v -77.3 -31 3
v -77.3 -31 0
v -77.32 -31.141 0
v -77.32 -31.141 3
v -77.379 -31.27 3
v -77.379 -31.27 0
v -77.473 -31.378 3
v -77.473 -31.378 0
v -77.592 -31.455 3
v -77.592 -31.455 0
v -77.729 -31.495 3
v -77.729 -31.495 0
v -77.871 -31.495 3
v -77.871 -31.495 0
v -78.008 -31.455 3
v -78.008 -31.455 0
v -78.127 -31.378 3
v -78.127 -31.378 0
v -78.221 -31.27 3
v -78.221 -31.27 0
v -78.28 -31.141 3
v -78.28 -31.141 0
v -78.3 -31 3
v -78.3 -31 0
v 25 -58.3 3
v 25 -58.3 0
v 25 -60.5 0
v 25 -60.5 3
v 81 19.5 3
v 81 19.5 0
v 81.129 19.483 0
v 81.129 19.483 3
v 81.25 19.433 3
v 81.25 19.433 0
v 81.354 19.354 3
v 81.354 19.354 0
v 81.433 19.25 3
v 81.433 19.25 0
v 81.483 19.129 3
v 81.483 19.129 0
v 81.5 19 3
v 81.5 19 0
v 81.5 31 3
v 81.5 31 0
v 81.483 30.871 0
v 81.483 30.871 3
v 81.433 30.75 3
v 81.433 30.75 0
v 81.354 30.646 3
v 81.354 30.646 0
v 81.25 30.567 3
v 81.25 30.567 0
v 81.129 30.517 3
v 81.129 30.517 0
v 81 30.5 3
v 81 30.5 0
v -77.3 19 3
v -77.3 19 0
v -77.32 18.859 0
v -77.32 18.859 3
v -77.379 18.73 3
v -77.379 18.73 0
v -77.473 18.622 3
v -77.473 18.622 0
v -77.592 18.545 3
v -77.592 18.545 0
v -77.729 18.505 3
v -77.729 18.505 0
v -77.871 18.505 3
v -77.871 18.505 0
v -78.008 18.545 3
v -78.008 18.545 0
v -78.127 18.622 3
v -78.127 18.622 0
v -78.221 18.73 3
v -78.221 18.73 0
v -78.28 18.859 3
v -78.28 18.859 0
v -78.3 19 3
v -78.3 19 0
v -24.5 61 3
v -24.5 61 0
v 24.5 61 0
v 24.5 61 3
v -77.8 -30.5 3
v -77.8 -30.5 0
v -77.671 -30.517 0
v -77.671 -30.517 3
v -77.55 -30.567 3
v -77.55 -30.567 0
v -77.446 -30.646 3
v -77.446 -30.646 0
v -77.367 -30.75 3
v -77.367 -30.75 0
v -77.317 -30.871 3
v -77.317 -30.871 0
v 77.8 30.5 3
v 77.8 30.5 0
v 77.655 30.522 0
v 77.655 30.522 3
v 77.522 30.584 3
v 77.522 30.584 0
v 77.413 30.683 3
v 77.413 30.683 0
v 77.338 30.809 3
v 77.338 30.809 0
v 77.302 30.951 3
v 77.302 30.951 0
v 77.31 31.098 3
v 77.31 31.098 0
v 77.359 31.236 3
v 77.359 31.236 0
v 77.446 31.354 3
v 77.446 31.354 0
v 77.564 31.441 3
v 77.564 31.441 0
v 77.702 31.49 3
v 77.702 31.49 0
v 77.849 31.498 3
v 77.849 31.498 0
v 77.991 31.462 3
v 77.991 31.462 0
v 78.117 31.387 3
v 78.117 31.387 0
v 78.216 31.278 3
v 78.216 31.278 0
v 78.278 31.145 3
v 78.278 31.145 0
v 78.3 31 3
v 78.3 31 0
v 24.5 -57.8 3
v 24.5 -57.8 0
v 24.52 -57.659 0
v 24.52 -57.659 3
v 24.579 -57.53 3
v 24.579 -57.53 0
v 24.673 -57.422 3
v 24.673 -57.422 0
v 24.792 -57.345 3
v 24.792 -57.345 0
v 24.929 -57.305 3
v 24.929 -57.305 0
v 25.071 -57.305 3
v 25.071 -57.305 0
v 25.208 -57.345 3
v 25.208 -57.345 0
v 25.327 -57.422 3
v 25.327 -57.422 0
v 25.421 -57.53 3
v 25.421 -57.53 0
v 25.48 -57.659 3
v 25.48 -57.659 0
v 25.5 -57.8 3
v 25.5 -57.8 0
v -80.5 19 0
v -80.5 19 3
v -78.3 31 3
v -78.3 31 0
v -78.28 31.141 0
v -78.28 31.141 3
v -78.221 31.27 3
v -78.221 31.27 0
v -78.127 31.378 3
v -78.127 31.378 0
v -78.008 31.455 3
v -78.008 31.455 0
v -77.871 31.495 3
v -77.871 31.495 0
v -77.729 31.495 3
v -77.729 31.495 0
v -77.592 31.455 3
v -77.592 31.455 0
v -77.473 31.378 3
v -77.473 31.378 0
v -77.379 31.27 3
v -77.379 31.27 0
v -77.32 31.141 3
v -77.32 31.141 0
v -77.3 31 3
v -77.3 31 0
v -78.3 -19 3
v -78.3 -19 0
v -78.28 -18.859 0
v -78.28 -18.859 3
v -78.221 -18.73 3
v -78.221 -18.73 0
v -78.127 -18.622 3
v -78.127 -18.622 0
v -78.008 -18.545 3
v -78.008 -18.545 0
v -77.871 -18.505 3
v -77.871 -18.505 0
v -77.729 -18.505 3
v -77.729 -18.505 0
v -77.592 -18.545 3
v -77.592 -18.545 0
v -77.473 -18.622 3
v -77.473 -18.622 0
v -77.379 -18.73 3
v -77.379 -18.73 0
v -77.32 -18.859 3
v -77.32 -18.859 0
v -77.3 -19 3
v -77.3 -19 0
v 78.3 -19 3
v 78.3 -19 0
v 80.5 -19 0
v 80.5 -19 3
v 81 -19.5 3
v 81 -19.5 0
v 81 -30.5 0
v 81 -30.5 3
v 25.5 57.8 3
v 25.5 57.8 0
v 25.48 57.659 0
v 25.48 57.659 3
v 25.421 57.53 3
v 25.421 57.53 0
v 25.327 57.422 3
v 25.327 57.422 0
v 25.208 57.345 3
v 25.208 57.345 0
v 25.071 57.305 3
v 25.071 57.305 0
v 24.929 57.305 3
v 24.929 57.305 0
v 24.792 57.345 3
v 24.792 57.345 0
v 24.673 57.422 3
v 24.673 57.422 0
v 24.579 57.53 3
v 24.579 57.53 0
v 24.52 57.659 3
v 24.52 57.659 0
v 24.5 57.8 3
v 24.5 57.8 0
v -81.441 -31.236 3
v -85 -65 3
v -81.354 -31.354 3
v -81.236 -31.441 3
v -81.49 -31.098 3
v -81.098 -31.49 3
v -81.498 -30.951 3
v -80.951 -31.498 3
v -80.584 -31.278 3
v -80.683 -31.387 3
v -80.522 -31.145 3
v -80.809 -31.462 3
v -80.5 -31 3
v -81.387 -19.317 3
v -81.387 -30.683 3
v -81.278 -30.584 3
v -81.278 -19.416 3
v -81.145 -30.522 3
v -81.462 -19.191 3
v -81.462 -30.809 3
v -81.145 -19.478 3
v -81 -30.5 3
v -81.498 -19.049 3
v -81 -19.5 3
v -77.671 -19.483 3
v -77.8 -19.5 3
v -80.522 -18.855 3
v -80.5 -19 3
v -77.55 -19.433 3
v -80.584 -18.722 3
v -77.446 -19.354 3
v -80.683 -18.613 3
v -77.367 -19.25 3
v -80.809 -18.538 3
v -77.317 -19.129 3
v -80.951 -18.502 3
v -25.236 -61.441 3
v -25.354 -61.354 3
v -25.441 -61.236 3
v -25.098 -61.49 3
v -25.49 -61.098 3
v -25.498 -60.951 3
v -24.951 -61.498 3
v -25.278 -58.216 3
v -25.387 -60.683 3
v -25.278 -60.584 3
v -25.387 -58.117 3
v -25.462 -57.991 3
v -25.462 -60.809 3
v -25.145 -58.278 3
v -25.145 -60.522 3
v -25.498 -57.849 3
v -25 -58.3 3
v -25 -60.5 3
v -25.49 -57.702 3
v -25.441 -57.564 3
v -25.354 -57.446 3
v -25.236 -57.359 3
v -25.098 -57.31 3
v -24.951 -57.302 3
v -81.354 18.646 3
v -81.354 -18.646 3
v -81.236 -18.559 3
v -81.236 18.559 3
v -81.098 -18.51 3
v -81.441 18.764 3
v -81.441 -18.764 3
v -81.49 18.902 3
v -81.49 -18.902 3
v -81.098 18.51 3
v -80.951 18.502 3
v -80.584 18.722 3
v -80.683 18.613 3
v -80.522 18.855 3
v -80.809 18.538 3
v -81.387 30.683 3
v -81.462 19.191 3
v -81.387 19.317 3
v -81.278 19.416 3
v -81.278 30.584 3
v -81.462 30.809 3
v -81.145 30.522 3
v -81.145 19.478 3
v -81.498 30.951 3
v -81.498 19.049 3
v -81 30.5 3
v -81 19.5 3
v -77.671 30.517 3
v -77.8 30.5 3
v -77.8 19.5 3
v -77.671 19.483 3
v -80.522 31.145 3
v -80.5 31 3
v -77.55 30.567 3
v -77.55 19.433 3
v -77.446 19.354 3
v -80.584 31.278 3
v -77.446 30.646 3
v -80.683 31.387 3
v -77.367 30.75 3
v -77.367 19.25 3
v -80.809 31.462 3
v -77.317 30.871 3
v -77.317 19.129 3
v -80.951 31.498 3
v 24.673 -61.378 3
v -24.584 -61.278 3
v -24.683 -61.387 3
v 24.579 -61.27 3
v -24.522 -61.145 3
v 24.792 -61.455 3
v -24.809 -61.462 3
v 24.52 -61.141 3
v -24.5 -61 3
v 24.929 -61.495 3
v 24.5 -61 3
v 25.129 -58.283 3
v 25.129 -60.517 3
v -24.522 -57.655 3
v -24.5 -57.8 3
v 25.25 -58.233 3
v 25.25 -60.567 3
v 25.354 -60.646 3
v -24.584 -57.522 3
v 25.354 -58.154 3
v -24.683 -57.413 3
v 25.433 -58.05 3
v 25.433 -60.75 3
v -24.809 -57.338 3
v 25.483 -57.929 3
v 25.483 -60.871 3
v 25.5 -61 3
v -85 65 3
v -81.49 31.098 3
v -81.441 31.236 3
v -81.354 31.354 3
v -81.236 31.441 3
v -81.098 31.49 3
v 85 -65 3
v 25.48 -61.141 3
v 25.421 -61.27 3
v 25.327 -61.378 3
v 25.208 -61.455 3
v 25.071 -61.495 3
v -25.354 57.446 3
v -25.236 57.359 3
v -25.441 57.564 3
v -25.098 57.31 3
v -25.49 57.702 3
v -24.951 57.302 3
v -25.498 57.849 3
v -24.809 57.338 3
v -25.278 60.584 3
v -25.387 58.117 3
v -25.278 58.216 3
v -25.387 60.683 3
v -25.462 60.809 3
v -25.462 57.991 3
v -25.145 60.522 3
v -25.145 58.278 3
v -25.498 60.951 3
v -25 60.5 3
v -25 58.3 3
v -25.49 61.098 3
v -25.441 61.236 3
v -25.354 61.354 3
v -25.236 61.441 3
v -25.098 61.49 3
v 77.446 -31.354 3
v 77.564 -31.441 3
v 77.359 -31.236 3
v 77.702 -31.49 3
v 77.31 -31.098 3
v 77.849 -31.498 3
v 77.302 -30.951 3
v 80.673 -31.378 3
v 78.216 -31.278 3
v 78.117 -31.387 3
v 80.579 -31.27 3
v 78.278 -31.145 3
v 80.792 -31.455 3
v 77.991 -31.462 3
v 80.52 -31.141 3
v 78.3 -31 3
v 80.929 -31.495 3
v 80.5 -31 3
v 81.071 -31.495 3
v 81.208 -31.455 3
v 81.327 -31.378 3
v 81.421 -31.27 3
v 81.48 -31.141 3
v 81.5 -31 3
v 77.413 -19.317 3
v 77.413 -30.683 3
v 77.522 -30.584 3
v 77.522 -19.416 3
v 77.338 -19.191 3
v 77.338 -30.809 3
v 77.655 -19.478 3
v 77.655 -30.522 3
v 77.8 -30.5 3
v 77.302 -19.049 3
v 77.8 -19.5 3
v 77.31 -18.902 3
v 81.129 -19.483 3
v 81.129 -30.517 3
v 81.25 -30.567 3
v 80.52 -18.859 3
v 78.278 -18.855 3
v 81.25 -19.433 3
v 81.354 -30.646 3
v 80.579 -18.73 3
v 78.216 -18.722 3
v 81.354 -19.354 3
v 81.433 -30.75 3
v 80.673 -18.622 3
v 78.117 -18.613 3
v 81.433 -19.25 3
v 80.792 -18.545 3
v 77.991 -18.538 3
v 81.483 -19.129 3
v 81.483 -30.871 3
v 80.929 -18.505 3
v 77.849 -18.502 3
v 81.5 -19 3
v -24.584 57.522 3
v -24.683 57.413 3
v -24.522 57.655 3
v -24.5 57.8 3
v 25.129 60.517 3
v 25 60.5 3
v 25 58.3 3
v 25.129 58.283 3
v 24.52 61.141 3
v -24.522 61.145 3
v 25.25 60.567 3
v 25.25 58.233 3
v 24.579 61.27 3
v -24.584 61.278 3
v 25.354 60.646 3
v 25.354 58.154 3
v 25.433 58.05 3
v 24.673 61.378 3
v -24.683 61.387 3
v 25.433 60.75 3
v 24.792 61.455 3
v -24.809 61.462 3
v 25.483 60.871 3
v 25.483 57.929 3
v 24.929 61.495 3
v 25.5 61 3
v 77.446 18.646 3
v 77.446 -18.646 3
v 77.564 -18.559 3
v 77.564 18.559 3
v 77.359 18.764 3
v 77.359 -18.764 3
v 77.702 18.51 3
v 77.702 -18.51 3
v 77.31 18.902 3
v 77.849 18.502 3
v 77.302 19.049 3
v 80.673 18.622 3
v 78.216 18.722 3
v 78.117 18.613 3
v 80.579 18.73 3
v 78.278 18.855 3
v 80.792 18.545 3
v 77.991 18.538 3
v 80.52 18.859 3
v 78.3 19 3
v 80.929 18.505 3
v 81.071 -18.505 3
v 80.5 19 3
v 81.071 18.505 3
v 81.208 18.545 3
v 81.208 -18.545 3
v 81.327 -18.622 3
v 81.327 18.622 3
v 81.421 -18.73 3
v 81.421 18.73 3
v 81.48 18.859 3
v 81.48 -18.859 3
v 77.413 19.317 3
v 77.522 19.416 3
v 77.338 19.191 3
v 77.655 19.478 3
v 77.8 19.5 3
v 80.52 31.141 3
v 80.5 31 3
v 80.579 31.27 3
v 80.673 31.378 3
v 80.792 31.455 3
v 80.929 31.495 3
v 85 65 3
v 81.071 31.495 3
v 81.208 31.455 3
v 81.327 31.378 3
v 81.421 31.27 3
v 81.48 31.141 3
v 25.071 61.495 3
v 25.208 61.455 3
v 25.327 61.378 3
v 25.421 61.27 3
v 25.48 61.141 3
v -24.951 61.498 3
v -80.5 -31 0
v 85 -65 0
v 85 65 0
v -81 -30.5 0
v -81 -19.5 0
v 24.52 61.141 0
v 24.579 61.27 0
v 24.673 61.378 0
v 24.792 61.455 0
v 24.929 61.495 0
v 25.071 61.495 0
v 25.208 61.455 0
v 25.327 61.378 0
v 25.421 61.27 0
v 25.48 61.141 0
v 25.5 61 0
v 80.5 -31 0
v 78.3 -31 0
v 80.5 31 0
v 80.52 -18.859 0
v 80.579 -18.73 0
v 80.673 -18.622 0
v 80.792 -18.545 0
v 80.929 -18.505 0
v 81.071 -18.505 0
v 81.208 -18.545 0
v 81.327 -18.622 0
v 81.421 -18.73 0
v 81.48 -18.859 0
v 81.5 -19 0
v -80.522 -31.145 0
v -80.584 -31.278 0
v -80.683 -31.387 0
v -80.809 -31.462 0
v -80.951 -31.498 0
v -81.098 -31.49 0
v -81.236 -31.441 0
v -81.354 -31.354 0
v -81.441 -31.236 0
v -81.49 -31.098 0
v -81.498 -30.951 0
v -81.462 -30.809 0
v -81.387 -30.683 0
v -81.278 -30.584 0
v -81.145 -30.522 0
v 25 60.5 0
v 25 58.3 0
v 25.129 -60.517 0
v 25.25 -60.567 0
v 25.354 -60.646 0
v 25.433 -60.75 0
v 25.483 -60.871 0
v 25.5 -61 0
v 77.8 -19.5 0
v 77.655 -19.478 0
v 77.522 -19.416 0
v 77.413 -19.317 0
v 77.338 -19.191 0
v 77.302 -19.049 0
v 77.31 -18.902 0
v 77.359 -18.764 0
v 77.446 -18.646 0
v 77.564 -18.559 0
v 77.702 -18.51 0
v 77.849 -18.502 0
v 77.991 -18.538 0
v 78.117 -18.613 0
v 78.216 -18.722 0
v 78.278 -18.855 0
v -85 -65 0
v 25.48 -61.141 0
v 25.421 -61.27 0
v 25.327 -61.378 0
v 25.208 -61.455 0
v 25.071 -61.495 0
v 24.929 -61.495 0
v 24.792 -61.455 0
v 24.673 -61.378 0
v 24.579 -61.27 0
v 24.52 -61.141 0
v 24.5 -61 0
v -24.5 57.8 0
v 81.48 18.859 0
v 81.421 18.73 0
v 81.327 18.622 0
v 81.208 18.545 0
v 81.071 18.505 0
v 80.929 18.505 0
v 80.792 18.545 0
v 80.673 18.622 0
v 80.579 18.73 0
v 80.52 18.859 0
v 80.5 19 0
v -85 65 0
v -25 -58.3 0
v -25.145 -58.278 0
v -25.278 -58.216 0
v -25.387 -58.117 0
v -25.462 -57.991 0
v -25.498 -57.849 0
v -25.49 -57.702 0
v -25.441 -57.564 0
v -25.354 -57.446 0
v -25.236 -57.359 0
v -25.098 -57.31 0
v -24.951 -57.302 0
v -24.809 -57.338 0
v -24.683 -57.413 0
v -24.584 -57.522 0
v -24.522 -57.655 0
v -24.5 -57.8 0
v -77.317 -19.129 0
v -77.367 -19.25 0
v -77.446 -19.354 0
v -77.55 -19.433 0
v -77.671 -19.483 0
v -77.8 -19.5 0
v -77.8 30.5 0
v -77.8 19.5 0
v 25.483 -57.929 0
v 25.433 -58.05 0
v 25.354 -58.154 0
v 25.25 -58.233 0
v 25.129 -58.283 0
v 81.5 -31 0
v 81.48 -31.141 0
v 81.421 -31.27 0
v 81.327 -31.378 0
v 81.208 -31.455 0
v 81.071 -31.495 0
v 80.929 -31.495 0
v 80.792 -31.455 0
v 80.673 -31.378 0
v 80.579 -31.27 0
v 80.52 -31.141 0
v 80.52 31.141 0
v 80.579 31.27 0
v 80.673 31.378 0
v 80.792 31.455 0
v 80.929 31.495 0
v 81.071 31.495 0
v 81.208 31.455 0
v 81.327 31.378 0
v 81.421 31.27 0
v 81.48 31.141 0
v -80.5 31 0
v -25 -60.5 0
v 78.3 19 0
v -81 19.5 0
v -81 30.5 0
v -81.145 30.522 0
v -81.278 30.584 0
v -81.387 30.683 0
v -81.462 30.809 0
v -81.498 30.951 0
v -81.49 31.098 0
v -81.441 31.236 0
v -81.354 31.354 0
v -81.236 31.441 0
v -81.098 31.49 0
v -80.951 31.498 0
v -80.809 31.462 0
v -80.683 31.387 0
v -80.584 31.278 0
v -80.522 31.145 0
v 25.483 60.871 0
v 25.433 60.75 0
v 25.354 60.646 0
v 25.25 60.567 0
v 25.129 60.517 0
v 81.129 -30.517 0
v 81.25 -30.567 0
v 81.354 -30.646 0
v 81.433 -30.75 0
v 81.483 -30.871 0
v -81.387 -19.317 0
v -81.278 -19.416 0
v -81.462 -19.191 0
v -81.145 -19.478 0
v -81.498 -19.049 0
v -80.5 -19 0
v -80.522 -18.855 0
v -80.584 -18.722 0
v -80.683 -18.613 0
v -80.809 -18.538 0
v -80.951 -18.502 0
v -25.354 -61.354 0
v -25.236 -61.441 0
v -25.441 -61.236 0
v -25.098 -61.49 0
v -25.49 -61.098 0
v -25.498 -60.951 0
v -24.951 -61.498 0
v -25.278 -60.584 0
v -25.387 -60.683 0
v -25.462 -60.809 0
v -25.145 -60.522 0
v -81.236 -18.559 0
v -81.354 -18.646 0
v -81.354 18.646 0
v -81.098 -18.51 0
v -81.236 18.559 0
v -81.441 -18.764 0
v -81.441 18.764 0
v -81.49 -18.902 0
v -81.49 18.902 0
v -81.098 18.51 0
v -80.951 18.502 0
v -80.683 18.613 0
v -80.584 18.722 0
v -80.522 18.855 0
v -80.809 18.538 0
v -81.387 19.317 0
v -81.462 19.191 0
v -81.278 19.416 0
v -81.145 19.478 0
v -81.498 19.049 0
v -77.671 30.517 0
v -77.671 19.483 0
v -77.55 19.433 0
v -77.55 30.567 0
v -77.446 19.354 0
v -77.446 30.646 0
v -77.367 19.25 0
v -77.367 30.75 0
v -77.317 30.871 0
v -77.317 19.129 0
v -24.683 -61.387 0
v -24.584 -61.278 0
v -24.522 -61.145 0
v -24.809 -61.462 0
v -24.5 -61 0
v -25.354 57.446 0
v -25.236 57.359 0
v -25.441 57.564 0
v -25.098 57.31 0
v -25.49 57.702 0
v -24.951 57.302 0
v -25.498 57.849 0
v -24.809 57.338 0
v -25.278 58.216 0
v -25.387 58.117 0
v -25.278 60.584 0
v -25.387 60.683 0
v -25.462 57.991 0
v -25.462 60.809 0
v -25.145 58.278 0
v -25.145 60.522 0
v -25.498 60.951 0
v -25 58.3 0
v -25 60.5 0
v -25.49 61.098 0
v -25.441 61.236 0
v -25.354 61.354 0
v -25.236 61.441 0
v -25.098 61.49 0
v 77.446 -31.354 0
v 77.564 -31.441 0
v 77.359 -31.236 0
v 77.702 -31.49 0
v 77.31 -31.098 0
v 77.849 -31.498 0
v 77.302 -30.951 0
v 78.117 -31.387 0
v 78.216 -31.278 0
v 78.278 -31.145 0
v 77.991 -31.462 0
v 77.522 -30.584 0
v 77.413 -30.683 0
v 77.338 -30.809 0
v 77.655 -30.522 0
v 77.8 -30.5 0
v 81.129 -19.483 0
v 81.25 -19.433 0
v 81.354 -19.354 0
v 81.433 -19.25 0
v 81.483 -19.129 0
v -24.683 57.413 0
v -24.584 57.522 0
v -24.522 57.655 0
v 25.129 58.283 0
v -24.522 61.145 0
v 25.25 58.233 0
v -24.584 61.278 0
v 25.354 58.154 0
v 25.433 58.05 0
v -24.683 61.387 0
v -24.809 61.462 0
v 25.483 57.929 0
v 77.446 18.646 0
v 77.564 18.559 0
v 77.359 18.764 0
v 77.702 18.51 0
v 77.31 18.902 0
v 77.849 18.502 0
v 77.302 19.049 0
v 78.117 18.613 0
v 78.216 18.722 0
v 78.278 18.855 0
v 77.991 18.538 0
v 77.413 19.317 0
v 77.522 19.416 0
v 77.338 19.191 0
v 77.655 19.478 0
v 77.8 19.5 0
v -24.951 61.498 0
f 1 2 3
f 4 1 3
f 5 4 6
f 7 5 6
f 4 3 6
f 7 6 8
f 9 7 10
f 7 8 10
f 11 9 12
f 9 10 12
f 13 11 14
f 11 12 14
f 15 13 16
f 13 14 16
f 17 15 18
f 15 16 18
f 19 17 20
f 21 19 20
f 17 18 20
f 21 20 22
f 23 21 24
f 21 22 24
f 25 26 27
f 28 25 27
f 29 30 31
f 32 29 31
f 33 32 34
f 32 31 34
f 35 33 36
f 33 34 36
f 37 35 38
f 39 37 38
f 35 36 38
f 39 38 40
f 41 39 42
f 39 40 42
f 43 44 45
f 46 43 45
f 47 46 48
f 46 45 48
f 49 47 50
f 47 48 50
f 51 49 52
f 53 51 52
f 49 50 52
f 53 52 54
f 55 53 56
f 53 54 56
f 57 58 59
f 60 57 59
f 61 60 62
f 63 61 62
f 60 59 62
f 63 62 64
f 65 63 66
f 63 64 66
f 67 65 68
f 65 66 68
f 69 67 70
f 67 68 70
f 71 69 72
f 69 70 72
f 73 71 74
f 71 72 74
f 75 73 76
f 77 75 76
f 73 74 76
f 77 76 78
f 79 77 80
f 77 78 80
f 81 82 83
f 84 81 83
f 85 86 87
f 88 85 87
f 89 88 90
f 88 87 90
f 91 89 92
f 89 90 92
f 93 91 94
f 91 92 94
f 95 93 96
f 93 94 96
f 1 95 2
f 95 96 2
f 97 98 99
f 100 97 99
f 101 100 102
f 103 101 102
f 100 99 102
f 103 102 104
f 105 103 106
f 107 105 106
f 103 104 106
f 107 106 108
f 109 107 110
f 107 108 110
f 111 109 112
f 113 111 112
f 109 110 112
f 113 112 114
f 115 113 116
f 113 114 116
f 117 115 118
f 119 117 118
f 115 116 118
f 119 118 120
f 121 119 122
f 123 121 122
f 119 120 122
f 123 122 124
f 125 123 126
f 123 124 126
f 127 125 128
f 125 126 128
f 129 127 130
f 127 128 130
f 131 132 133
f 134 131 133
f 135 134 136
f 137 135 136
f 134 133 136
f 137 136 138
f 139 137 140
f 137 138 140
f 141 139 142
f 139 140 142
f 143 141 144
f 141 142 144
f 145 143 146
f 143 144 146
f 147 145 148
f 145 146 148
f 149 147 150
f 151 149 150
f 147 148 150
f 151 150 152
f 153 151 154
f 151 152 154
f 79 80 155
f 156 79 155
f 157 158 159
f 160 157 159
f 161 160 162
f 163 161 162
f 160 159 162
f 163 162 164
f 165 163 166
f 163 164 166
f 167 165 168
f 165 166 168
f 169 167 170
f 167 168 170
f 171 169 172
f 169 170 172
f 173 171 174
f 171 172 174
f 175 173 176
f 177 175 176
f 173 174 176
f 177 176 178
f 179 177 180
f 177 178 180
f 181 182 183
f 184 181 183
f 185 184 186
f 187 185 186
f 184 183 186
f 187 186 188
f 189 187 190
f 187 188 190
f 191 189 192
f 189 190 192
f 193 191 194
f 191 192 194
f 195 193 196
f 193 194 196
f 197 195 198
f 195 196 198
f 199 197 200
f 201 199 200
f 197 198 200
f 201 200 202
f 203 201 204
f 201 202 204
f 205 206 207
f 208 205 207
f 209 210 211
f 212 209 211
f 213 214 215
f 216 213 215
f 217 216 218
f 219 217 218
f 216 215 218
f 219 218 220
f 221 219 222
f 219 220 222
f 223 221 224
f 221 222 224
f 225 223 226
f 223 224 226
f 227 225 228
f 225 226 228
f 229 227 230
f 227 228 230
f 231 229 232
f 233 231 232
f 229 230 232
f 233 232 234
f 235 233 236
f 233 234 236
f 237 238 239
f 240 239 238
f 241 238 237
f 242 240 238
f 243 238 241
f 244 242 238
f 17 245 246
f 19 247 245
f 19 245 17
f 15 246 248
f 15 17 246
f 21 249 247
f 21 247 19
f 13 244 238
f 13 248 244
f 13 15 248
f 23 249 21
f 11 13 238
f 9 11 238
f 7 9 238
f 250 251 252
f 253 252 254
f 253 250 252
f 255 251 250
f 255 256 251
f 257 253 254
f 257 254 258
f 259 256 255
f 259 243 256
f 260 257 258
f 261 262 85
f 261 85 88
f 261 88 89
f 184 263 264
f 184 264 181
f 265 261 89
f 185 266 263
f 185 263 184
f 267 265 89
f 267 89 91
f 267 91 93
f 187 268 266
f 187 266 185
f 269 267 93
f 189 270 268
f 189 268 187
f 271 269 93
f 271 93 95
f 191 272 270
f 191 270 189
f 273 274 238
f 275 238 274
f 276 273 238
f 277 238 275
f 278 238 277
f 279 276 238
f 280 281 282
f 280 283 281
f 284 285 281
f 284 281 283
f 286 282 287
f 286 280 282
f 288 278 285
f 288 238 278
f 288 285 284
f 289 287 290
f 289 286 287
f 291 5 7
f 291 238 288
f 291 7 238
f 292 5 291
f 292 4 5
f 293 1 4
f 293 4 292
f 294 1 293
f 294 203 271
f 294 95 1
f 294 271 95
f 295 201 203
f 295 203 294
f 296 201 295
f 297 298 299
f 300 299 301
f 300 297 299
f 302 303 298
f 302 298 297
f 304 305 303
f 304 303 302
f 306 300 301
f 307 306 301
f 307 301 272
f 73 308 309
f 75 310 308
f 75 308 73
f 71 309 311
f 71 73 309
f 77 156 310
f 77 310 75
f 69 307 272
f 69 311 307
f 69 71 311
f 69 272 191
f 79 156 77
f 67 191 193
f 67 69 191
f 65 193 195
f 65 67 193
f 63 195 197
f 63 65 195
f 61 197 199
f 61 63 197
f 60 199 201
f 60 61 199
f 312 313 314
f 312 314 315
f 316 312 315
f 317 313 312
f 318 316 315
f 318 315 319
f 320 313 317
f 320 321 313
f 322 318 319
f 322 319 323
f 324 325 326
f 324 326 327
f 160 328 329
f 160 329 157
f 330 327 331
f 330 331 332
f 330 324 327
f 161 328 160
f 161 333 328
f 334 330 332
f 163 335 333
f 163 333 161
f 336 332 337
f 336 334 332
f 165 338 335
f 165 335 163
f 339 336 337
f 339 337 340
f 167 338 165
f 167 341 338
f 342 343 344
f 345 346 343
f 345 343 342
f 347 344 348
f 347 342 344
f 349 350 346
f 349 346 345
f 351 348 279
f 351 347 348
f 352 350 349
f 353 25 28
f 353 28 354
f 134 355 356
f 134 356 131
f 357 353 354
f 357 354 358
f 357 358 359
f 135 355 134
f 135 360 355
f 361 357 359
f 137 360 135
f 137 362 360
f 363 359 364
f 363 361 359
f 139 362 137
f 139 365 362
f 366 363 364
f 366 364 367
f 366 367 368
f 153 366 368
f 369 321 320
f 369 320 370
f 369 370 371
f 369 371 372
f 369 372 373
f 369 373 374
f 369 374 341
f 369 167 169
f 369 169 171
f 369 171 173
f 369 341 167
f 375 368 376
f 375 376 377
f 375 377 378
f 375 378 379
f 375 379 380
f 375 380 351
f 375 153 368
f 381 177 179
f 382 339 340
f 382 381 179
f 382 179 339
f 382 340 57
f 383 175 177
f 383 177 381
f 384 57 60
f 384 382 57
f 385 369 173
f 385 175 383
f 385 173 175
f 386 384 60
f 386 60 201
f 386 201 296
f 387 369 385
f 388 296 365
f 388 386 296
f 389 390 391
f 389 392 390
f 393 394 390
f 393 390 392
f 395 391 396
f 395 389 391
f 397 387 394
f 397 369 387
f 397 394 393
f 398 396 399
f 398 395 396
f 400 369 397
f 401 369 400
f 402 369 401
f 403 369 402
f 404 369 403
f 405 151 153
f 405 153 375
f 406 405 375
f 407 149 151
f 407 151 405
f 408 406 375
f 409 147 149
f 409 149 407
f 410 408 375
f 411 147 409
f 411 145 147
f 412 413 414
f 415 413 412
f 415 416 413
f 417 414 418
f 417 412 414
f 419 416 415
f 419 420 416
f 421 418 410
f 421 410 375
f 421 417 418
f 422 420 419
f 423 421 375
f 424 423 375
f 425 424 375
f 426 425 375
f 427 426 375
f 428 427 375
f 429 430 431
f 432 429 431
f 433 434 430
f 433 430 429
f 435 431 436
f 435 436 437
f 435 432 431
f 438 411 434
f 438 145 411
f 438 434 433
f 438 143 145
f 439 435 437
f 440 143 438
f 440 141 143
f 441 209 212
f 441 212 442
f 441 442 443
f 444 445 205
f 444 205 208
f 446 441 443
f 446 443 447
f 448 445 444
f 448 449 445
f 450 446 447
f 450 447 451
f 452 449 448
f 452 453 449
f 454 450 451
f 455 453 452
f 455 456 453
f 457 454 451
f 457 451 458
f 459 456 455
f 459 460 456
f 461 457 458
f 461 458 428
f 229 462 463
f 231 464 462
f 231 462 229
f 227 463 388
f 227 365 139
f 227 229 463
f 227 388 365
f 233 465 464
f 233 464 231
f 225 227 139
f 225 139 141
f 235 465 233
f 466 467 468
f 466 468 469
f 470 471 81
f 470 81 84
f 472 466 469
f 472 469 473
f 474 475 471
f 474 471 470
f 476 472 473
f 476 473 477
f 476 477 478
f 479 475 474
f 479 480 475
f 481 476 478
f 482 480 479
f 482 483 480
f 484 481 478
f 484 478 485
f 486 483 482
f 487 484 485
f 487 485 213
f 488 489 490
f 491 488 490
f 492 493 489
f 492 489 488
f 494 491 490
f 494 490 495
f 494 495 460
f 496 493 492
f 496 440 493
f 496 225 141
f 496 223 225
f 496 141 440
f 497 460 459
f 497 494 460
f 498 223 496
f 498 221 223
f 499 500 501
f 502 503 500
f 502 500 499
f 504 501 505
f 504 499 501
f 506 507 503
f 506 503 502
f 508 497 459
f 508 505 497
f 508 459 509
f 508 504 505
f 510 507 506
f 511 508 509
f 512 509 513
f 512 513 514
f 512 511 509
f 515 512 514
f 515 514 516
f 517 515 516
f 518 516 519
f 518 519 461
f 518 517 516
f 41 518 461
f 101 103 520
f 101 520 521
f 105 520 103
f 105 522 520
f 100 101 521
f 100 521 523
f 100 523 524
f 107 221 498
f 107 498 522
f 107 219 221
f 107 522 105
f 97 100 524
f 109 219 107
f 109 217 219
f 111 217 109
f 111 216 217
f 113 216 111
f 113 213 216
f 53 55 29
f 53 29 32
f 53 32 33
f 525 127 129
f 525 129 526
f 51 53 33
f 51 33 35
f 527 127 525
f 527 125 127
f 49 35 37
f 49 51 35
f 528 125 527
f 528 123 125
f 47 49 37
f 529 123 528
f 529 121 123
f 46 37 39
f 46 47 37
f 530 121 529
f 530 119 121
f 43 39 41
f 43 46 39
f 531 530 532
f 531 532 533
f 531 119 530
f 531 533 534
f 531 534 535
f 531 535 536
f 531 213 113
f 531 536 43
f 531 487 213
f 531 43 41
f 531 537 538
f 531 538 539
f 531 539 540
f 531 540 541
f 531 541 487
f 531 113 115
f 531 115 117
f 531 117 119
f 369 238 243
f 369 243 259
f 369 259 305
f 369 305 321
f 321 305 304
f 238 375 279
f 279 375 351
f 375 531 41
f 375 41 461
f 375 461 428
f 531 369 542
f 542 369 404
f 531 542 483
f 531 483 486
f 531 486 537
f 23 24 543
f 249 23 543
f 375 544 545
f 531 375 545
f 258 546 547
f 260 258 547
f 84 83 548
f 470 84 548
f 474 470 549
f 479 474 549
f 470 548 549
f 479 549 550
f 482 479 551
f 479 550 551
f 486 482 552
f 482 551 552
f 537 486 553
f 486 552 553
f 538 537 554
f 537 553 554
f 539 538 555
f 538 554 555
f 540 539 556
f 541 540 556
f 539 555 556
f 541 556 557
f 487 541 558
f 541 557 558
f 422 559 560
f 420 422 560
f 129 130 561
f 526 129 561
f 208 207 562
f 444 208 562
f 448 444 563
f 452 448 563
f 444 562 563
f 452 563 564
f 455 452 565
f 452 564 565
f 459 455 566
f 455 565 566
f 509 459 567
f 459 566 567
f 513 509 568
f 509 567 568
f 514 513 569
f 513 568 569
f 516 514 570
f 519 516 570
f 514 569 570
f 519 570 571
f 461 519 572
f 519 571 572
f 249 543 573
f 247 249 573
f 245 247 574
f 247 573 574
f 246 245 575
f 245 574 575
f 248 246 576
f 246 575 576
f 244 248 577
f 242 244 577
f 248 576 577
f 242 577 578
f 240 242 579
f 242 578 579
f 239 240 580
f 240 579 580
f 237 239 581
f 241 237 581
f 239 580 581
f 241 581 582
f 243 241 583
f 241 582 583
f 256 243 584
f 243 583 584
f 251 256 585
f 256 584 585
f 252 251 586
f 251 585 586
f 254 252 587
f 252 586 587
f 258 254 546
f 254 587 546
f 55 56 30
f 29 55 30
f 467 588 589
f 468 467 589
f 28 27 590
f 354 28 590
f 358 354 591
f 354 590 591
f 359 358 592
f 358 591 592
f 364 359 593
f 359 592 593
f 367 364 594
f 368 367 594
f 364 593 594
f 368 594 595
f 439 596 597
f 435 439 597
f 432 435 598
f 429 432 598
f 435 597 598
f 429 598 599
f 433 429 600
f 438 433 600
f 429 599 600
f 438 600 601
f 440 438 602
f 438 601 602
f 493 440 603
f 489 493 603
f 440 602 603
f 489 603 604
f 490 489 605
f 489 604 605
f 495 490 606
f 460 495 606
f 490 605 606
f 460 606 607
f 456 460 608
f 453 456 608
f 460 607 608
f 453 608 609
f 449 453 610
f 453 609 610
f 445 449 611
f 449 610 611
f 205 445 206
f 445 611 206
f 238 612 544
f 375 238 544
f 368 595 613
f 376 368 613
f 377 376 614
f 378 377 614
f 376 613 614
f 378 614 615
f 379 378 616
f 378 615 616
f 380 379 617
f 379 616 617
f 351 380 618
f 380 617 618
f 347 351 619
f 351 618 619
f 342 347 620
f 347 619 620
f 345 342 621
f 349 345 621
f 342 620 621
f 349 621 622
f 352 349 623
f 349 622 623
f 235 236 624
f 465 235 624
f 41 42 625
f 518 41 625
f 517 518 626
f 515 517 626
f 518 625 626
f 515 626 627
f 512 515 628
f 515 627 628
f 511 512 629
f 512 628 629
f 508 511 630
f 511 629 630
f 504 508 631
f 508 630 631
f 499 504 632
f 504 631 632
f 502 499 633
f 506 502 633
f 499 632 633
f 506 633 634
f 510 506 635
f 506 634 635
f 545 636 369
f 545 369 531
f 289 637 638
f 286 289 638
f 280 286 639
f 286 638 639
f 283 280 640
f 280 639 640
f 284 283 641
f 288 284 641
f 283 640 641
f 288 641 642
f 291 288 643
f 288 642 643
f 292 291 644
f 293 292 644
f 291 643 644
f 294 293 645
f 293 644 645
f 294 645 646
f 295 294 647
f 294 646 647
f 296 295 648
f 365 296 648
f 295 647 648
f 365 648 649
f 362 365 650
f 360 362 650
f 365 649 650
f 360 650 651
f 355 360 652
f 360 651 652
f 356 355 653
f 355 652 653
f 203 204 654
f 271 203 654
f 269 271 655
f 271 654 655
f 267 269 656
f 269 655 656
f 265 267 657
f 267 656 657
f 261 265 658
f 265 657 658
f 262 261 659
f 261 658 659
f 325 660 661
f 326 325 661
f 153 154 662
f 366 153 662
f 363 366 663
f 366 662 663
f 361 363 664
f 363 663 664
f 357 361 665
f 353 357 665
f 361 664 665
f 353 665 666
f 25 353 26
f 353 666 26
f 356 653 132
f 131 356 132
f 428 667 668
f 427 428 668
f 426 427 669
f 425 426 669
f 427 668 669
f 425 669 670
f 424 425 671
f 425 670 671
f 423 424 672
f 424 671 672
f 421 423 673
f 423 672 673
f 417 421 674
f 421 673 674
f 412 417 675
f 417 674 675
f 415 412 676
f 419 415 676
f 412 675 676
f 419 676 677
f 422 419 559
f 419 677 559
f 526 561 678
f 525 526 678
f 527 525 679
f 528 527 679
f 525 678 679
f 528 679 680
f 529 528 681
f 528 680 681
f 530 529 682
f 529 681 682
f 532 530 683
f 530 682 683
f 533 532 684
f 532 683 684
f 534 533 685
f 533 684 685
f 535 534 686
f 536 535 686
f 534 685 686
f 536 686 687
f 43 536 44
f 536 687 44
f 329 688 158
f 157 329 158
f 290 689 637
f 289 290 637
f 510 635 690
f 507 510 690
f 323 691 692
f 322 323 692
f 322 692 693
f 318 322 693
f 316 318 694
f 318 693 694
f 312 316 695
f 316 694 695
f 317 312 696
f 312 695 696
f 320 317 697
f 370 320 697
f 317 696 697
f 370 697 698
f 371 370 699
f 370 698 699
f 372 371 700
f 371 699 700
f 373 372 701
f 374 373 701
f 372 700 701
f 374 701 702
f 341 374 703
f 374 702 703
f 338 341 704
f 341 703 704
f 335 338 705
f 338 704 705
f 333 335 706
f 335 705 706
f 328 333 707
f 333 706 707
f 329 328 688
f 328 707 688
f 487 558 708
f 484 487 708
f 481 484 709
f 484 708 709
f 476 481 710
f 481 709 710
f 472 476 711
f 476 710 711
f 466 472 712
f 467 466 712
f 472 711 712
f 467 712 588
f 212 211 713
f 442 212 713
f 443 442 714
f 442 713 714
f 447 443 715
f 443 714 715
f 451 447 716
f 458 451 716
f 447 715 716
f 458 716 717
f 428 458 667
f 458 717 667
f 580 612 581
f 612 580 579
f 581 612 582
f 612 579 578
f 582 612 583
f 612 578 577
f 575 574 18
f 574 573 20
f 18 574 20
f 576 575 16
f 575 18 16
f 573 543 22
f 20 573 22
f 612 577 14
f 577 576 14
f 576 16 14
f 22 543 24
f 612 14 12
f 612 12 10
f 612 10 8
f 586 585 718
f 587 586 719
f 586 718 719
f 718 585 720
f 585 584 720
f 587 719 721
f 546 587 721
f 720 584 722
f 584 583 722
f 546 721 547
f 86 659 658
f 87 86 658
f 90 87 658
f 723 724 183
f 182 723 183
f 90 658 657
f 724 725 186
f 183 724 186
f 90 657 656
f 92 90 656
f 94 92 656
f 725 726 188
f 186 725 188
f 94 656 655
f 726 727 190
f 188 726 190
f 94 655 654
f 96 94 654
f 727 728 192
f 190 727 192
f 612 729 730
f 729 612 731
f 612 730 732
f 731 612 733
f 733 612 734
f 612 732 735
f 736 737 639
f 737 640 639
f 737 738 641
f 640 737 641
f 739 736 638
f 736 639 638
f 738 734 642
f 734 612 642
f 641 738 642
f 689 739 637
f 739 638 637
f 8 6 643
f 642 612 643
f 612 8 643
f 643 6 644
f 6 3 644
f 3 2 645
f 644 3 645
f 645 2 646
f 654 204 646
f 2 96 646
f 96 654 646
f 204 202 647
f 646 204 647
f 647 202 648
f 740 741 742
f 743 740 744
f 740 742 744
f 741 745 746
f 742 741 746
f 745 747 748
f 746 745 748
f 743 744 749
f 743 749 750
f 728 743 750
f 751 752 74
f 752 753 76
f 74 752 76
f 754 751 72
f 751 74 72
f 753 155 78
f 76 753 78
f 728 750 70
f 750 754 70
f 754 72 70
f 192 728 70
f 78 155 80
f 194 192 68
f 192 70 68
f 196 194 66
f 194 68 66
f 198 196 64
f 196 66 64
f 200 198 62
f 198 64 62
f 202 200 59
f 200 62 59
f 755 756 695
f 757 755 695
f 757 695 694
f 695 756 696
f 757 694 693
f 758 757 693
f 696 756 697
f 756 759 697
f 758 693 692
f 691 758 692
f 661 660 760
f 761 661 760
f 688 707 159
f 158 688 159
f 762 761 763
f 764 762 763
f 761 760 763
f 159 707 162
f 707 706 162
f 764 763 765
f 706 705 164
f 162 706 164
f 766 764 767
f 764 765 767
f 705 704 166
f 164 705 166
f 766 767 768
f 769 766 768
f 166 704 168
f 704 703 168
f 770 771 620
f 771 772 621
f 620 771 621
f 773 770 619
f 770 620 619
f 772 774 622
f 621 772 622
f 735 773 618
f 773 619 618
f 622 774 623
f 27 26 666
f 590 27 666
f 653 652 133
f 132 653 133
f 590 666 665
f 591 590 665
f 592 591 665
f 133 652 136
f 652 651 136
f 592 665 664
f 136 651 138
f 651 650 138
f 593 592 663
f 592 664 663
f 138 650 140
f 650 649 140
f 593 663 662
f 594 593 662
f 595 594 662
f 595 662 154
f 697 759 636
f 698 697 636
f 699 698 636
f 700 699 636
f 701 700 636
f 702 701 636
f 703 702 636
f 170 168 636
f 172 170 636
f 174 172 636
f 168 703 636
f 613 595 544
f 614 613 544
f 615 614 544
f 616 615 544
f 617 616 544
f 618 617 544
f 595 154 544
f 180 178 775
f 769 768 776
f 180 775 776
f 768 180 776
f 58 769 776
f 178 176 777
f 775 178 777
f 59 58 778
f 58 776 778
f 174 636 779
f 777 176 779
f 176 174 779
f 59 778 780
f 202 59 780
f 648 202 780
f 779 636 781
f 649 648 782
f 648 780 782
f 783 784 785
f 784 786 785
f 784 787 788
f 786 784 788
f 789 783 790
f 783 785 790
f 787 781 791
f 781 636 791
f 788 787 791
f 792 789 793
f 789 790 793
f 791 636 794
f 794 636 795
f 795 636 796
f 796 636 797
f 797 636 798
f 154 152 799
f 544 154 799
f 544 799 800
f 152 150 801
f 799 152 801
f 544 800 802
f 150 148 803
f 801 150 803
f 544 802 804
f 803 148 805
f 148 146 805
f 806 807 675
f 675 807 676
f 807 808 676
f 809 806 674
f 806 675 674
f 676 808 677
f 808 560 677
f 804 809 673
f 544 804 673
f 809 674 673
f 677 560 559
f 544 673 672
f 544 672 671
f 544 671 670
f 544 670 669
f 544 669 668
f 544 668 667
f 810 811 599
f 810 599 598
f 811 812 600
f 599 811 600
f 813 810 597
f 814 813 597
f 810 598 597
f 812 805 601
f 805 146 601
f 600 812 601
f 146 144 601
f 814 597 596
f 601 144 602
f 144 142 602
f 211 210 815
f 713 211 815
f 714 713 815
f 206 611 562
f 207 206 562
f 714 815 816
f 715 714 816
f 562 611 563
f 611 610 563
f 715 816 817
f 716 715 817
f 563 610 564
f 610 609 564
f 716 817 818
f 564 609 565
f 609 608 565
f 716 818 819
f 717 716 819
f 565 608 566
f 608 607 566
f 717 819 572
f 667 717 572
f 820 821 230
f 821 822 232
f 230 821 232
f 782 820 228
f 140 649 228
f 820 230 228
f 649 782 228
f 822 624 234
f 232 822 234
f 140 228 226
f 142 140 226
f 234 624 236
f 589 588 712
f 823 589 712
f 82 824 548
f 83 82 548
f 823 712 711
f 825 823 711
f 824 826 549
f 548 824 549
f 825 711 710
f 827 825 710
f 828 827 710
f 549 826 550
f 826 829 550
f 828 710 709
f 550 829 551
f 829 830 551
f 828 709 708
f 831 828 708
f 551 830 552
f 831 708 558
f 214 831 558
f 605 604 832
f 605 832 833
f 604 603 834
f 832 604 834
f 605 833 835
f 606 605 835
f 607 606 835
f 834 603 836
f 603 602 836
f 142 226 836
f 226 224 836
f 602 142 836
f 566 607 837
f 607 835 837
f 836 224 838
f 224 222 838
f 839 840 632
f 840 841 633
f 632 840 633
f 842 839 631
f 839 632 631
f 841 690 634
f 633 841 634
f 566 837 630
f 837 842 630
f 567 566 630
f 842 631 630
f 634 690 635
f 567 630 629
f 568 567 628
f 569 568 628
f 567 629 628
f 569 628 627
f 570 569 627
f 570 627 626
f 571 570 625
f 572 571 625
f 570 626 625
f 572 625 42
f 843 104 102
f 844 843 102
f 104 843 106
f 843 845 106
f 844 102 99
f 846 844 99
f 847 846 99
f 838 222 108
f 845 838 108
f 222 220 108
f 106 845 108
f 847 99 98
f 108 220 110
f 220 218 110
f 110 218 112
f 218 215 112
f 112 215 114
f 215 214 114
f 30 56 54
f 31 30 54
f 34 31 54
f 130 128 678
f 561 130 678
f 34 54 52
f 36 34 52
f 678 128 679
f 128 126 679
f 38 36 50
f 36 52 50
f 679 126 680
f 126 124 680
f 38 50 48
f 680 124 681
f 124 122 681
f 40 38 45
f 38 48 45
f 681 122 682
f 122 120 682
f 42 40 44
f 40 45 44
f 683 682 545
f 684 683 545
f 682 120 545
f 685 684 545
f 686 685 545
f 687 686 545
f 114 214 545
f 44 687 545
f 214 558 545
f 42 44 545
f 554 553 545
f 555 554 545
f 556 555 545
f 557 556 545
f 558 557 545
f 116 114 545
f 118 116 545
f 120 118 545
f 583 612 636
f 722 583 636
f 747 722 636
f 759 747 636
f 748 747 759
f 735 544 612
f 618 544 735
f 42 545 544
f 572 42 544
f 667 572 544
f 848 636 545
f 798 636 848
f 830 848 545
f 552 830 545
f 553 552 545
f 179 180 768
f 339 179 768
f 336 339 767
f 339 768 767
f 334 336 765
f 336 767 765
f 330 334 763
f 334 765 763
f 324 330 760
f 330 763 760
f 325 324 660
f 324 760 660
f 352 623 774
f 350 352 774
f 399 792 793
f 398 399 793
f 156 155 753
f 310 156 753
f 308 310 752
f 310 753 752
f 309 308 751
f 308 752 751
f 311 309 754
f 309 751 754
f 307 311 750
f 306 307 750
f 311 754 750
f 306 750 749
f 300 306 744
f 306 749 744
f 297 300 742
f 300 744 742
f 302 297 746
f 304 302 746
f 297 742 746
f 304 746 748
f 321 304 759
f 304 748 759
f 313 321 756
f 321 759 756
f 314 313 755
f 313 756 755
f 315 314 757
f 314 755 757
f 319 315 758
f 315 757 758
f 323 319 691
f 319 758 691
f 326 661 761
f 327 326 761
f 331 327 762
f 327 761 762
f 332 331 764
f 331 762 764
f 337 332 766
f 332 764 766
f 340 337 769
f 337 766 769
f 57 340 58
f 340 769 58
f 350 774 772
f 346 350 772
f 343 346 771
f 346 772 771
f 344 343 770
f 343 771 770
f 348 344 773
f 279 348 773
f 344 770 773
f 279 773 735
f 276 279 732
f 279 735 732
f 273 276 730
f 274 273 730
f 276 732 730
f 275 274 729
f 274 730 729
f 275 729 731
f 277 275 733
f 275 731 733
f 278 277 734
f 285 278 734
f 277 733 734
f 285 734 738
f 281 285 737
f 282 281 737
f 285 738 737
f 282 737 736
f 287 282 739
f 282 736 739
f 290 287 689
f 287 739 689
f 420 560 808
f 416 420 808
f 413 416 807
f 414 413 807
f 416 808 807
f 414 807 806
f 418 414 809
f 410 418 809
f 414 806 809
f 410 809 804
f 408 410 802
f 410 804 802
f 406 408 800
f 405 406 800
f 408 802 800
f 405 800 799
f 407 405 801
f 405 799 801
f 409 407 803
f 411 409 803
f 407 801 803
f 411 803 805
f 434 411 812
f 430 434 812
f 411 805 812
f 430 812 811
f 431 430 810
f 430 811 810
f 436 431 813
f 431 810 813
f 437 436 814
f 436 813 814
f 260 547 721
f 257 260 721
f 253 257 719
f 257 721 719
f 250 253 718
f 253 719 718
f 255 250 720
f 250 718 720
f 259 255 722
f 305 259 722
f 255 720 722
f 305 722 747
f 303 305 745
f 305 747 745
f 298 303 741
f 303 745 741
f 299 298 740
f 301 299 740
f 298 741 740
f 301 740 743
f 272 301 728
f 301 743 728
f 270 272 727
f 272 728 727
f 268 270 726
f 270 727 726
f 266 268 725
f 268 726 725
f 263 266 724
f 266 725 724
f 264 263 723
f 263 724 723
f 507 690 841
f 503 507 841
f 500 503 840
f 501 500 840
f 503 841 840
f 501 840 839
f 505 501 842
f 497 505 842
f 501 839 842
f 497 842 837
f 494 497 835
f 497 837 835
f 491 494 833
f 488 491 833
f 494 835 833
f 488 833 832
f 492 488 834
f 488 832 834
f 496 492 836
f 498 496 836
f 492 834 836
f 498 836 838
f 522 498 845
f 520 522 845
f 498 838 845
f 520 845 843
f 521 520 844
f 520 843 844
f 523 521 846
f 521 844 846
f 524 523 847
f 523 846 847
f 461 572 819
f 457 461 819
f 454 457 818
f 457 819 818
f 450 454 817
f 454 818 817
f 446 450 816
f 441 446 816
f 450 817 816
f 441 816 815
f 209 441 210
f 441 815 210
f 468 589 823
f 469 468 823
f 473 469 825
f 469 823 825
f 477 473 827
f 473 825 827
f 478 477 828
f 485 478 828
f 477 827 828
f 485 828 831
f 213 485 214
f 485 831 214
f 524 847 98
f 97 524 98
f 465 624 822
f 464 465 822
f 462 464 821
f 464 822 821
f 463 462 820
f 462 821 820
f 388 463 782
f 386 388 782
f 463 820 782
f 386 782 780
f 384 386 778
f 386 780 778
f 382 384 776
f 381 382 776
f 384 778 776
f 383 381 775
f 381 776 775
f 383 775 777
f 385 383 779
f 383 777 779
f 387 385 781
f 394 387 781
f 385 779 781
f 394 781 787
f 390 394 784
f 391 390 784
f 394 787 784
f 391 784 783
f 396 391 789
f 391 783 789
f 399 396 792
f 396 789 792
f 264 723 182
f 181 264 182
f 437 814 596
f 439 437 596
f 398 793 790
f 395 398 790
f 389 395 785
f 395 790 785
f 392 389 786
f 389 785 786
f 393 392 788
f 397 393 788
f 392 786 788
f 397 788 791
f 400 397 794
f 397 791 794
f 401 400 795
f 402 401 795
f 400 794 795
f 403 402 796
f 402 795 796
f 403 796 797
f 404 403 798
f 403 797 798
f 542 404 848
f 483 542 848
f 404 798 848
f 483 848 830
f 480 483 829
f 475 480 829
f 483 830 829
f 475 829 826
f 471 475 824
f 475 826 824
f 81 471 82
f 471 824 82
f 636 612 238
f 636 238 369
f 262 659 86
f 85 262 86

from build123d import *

# Parameters (mm, degrees)
F0_W     = 170
F0_H     = 130
F1_DEPTH = 3


with BuildPart() as f1:
    # F0 (on Top) → F1 (new body)
    with BuildSketch(Plane.XY):
        Rectangle(F0_W, F0_H)
        with BuildLine():
            ThreePointArc((-81, -19.5), (-81.353553, -18.646447), (-80.5, -19))
            Line((-80.5, -19), (-78.3, -19))
            ThreePointArc((-78.3, -19), (-77.8, -18.5), (-77.3, -19))
            ThreePointArc((-77.3, -19), (-77.446447, -19.353553), (-77.8, -19.5))
            Line((-77.8, -19.5), (-77.8, -30.5))
            ThreePointArc((-77.8, -30.5), (-77.446447, -30.646447), (-77.3, -31))
            ThreePointArc((-77.3, -31), (-77.8, -31.5), (-78.3, -31))
            Line((-78.3, -31), (-80.5, -31))
            ThreePointArc((-80.5, -31), (-81.353553, -31.353553), (-81, -30.5))
            Line((-81, -30.5), (-81, -19.5))
        make_face(mode=Mode.SUBTRACT)
        with BuildLine():
            ThreePointArc((-25, -58.3), (-25.353553, -57.446447), (-24.5, -57.8))
            Line((-24.5, -57.8), (24.5, -57.8))
            ThreePointArc((24.5, -57.8), (25, -57.3), (25.5, -57.8))
            ThreePointArc((25.5, -57.8), (25.353553, -58.153553), (25, -58.3))
            Line((25, -58.3), (25, -60.5))
            ThreePointArc((25, -60.5), (25.353553, -60.646447), (25.5, -61))
            ThreePointArc((25.5, -61), (25, -61.5), (24.5, -61))
            Line((24.5, -61), (-24.5, -61))
            ThreePointArc((-24.5, -61), (-25.353553, -61.353553), (-25, -60.5))
            Line((-25, -60.5), (-25, -58.3))
        make_face(mode=Mode.SUBTRACT)
        with BuildLine():
            ThreePointArc((77.8, -19.5), (77.446447, -18.646447), (78.3, -19))
            Line((78.3, -19), (80.5, -19))
            ThreePointArc((80.5, -19), (81, -18.5), (81.5, -19))
            ThreePointArc((81.5, -19), (81.353553, -19.353553), (81, -19.5))
            Line((81, -19.5), (81, -30.5))
            ThreePointArc((81, -30.5), (81.353553, -30.646447), (81.5, -31))
            ThreePointArc((81.5, -31), (81, -31.5), (80.5, -31))
            Line((80.5, -31), (78.3, -31))
            ThreePointArc((78.3, -31), (77.446447, -31.353553), (77.8, -30.5))
            Line((77.8, -30.5), (77.8, -19.5))
        make_face(mode=Mode.SUBTRACT)
        with BuildLine():
            ThreePointArc((-80.5, 19), (-81.353553, 18.646447), (-81, 19.5))
            Line((-81, 19.5), (-81, 30.5))
            ThreePointArc((-81, 30.5), (-81.353553, 31.353553), (-80.5, 31))
            Line((-80.5, 31), (-78.3, 31))
            ThreePointArc((-78.3, 31), (-77.8, 31.5), (-77.3, 31))
            ThreePointArc((-77.3, 31), (-77.446447, 30.646447), (-77.8, 30.5))
            Line((-77.8, 30.5), (-77.8, 19.5))
            ThreePointArc((-77.8, 19.5), (-77.446447, 19.353553), (-77.3, 19))
            ThreePointArc((-77.3, 19), (-77.8, 18.5), (-78.3, 19))
            Line((-78.3, 19), (-80.5, 19))
        make_face(mode=Mode.SUBTRACT)
        with BuildLine():
            ThreePointArc((77.8, 30.5), (77.446447, 31.353553), (78.3, 31))
            Line((78.3, 31), (80.5, 31))
            ThreePointArc((80.5, 31), (81, 31.5), (81.5, 31))
            ThreePointArc((81.5, 31), (81.353553, 30.646447), (81, 30.5))
            Line((81, 30.5), (81, 19.5))
            ThreePointArc((81, 19.5), (81.353553, 19.353553), (81.5, 19))
            ThreePointArc((81.5, 19), (81, 18.5), (80.5, 19))
            Line((80.5, 19), (78.3, 19))
            ThreePointArc((78.3, 19), (77.446447, 18.646447), (77.8, 19.5))
            Line((77.8, 19.5), (77.8, 30.5))
        make_face(mode=Mode.SUBTRACT)
        with BuildLine():
            ThreePointArc((-25, 60.5), (-25.353553, 61.353553), (-24.5, 61))
            Line((-24.5, 61), (24.5, 61))
            ThreePointArc((24.5, 61), (25, 61.5), (25.5, 61))
            ThreePointArc((25.5, 61), (25.353553, 60.646447), (25, 60.5))
            Line((25, 60.5), (25, 58.3))
            ThreePointArc((25, 58.3), (25.353553, 58.153553), (25.5, 57.8))
            ThreePointArc((25.5, 57.8), (25, 57.3), (24.5, 57.8))
            Line((24.5, 57.8), (-24.5, 57.8))
            ThreePointArc((-24.5, 57.8), (-25.353553, 57.446447), (-25, 58.3))
            Line((-25, 58.3), (-25, 60.5))
        make_face(mode=Mode.SUBTRACT)
    extrude(amount=F1_DEPTH)


solid = f1.part
